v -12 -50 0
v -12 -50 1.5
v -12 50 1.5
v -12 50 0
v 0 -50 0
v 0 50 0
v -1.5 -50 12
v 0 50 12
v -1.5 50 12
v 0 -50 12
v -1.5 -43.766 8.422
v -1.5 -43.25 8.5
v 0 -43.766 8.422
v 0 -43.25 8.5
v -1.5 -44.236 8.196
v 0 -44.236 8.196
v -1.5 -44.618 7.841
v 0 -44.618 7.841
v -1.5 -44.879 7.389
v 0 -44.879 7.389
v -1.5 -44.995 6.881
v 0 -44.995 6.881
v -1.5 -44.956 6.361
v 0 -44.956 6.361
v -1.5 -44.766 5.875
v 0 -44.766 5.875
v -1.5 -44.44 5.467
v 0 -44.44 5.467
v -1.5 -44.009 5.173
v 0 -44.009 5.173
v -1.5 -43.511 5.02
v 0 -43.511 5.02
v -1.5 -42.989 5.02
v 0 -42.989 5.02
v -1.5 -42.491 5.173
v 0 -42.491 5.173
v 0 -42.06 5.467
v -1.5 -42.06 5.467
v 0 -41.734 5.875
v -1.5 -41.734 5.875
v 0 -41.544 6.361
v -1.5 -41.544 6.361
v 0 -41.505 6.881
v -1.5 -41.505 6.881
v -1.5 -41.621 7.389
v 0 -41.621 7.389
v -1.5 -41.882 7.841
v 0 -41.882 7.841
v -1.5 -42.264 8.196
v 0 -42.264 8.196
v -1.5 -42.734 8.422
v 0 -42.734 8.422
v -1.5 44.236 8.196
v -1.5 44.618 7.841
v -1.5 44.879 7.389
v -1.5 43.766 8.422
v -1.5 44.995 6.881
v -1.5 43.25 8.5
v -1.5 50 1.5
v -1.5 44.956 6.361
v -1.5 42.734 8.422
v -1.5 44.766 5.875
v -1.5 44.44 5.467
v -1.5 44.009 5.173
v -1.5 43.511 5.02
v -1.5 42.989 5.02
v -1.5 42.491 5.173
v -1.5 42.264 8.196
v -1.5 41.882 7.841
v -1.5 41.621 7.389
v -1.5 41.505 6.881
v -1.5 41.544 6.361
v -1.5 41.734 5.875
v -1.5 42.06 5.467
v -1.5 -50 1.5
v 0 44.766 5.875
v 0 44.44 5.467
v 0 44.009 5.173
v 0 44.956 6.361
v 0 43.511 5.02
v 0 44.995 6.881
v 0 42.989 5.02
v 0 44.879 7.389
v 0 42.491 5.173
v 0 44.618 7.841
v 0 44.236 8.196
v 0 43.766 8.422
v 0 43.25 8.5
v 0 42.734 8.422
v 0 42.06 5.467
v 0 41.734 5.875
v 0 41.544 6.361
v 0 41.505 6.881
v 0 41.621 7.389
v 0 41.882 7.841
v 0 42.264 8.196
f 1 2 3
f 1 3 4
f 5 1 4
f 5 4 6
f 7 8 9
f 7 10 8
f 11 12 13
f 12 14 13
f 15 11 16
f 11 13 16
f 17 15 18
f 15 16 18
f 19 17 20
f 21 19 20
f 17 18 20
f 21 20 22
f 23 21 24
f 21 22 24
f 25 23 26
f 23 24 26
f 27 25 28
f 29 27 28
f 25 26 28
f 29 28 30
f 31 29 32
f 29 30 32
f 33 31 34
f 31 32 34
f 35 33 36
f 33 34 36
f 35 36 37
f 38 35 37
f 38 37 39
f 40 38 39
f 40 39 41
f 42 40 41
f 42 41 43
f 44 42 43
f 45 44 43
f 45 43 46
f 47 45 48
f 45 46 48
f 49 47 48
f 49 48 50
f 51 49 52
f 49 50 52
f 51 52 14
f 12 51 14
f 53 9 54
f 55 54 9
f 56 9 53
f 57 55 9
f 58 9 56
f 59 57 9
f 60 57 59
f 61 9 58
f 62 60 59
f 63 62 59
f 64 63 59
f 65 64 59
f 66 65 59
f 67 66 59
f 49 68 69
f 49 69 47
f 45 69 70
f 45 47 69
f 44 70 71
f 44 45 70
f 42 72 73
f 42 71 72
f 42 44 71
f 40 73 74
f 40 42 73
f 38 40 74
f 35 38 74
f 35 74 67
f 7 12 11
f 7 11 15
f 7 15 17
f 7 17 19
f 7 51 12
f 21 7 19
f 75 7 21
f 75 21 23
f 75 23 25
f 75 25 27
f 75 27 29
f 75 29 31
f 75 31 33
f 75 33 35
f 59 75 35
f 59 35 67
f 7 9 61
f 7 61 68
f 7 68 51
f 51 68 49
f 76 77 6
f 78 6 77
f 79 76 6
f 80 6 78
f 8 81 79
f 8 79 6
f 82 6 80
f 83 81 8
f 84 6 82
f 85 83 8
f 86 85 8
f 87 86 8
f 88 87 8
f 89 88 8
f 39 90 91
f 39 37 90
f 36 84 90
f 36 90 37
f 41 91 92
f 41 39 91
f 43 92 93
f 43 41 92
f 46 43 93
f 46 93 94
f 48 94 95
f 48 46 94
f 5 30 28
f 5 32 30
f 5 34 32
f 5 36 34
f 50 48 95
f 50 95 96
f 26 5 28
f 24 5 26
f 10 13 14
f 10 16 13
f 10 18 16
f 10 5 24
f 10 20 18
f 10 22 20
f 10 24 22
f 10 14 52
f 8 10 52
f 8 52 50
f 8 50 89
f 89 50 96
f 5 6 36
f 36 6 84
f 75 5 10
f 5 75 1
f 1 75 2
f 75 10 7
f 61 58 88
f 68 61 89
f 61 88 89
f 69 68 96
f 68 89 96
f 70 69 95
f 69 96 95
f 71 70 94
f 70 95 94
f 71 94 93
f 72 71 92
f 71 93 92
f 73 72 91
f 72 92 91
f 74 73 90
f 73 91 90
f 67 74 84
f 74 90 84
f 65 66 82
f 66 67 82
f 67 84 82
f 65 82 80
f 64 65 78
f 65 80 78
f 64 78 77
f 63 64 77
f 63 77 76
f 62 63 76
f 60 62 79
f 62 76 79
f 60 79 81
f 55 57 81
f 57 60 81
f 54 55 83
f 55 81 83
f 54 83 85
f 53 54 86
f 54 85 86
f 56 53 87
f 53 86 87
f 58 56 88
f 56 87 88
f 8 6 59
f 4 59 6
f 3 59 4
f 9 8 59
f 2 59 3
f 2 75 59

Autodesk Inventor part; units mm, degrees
ref_plane "YZ Plane" through (0, 0, 0) normal (1, 0, 0) x (0, 1, 0)
ref_plane "XZ Plane" through (0, 0, 0) normal (0, 1, 0) x (-1, 0, 0)
ref_plane "XY Plane" through (0, 0, 0) normal (0, 0, 1) x (1, 0, 0)
sketch "Szkic1" plane through (0, 0, 0) normal (0, 1, 0) x (-1, 0, 0)
  line L0 (0, 0) -> (0, 12)
  line L1 (0, 12) -> (1.5, 12)
  line L2 (1.5, 12) -> (1.5, 1.5)
  line L3 (1.5, 1.5) -> (12, 1.5)
  line L4 (12, 1.5) -> (12, 0)
  line L5 (12, 0) -> (0, 0)
  dimension "d0" = 12
  dimension "d1" = 1.5
  dimension "d2" = 10.5
  dimension "d3" = 10.5
extrude "Wyciągnięcie proste1" add sketch "Szkic1" along normal mid plane 100
sketch "Szkic2" plane through (-1.5, -50, 12) normal (-1, 0, 0) x (0, 0, 1)
  line L0 (0, 100) -> (0, 0) projected
  line L1 (0, 0) -> (-10.5, 0) projected
  point P0 (-12, 50)
  point P1 (-5.25, 6.75)
  dimension "d6" = 6.75
  dimension "d7" = 5.25
hole "Otwór1" at (-1.5, -43.25, 6.75) direction (1, 0, 0) diameter 3.5 end through all
mirror "Odbij1" about plane through (0, 0, 0) normal (0, 1, 0) of "Otwór1"
properties part number "bepf_platforma_rama_lacznik_pionowy" material "Aluminium 6061"
